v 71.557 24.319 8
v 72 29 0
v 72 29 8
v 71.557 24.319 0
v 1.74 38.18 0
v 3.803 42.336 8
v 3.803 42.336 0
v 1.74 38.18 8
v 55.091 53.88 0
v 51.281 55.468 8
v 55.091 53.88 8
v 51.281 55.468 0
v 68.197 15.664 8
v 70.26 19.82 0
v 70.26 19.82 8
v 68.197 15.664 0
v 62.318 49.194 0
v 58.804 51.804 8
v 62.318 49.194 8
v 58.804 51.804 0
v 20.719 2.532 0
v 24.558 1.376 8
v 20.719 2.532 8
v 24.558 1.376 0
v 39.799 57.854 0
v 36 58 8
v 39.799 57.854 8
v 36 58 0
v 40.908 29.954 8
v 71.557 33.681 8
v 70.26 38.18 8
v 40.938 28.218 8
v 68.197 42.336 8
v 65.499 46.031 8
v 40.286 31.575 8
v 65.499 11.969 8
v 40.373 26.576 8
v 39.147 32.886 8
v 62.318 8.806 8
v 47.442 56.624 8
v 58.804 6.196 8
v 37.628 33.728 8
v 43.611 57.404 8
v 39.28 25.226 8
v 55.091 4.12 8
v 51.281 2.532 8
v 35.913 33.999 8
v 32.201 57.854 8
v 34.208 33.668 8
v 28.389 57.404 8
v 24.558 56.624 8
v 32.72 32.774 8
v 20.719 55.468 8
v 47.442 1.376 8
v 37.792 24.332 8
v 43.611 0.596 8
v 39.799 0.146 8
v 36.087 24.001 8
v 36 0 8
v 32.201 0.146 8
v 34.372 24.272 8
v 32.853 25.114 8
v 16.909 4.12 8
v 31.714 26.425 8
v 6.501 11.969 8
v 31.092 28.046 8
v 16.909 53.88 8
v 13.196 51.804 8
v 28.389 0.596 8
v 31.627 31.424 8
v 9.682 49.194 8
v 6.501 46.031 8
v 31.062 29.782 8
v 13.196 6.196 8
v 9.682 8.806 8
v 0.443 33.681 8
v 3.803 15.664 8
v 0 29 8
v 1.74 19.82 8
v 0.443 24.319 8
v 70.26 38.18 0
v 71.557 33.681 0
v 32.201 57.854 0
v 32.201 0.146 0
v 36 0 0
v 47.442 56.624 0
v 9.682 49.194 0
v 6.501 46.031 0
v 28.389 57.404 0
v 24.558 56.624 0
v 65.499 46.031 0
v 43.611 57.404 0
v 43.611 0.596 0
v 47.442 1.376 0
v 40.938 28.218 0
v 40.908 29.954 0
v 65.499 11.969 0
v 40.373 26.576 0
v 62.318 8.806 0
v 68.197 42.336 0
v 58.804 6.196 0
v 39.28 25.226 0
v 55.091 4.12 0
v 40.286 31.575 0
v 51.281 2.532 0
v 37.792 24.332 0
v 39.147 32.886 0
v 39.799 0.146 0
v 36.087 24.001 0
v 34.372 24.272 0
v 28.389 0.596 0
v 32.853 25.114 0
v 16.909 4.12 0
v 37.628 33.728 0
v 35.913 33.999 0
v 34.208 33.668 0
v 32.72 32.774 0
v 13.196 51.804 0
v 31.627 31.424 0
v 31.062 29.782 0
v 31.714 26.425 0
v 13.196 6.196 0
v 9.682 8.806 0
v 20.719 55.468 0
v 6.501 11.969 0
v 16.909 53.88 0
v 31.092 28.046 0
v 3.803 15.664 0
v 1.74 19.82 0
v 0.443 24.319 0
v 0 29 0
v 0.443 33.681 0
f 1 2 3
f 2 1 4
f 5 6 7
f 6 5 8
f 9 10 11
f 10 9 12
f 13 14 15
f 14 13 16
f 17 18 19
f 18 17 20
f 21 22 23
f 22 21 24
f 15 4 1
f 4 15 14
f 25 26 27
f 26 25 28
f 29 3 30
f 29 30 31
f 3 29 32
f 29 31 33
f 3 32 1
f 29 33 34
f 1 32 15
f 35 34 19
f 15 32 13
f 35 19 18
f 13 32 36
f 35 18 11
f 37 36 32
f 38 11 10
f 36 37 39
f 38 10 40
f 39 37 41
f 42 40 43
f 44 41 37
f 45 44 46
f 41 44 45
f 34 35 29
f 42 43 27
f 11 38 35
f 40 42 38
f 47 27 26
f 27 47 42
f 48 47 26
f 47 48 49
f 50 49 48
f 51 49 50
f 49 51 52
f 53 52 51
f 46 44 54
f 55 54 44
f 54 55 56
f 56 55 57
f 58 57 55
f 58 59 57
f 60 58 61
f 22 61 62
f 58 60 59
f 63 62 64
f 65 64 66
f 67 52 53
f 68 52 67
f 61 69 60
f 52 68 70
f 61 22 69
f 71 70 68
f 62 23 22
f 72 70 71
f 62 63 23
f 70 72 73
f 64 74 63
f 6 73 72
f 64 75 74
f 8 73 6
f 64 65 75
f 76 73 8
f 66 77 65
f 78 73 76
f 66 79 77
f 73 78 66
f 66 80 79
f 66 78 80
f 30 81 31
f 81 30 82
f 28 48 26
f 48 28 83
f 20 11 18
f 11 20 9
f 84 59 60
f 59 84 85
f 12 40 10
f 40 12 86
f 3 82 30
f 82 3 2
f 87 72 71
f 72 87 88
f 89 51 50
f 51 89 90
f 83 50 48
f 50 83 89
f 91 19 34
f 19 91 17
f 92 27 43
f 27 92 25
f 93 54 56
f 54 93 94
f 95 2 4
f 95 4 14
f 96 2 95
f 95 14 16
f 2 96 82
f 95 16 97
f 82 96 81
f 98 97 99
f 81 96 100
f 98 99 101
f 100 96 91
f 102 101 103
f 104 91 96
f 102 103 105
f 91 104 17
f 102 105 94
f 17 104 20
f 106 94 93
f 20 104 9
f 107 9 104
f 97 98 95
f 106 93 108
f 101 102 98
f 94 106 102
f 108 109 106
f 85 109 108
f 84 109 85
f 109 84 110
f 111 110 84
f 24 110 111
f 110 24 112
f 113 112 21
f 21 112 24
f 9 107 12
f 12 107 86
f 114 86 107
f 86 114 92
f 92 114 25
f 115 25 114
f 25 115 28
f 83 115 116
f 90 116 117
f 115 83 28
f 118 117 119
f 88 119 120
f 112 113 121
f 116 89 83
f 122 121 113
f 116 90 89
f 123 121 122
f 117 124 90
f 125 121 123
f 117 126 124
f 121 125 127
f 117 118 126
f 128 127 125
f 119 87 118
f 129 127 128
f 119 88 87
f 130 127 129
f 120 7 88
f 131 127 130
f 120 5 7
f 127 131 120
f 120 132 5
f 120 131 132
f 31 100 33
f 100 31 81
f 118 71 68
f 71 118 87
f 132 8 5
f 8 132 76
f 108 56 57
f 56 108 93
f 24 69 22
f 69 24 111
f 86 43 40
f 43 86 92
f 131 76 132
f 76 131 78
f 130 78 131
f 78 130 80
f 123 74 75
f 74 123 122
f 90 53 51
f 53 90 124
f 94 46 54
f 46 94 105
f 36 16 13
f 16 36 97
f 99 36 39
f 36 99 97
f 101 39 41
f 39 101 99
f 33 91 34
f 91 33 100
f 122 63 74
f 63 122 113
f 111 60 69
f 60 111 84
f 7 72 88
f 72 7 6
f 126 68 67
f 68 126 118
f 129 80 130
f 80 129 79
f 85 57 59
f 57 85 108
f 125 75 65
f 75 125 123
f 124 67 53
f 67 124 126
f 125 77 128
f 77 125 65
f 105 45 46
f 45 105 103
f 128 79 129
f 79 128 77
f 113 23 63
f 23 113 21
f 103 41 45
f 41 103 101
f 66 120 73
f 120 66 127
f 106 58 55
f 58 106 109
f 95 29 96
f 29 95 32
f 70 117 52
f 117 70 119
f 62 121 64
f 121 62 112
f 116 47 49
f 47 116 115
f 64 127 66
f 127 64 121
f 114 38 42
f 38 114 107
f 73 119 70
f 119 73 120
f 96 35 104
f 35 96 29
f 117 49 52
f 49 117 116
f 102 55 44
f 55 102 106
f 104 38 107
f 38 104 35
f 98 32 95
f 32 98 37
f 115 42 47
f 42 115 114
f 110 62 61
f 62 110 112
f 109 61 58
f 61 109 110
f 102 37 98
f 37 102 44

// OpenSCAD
$fn = 32;

// ----------------------------------------------------------------------
// Cam plate: double_lobe cam, base R28
// ----------------------------------------------------------------------

// --- parameters (mm) ---
base_r = 28;              // base circle radius
lobe_h = 8;               // cam lobe rise
bore_r = 5;               // shaft bore radius
plate_t = 8;              // plate thickness, Z (extrusion height)
fit_tol = 0.1;            // declared fit tolerance (prompt contract)
free_tol = 0.3;           // declared free tolerance (prompt contract)

profile = [[72, 29], [71.557, 33.681], [70.26, 38.18], [68.197, 42.336], [65.499, 46.031], [62.318, 49.194], [58.804, 51.804], [55.091, 53.88], [51.281, 55.468], [47.442, 56.624], [43.611, 57.404], [39.799, 57.854], [36, 58], [32.201, 57.854], [28.389, 57.404], [24.558, 56.624], [20.719, 55.468], [16.909, 53.88], [13.196, 51.804], [9.682, 49.194], [6.501, 46.031], [3.803, 42.336], [1.74, 38.18], [0.443, 33.681], [0, 29], [0.443, 24.319], [1.74, 19.82], [3.803, 15.664], [6.501, 11.969], [9.682, 8.806], [13.196, 6.196], [16.909, 4.12], [20.719, 2.532], [24.558, 1.376], [28.389, 0.596], [32.201, 0.146], [36, 0], [39.799, 0.146], [43.611, 0.596], [47.442, 1.376], [51.281, 2.532], [55.091, 4.12], [58.804, 6.196], [62.318, 8.806], [65.499, 11.969], [68.197, 15.664], [70.26, 19.82], [71.557, 24.319]];  // primary outline, 48 points, counter clockwise
void_1 = [[40.908, 29.954], [40.286, 31.575], [39.147, 32.886], [37.628, 33.728], [35.913, 33.999], [34.208, 33.668], [32.72, 32.774], [31.627, 31.424], [31.062, 29.782], [31.092, 28.046], [31.714, 26.425], [32.853, 25.114], [34.372, 24.272], [36.087, 24.001], [37.792, 24.332], [39.28, 25.226], [40.373, 26.576], [40.938, 28.218]];  // shaft bore, 18 points

// --- the one profile operation ---
difference() {
  linear_extrude(height = plate_t) polygon(points = profile);
  translate([0, 0, -1])
    linear_extrude(height = plate_t + 2) polygon(points = void_1);
}
